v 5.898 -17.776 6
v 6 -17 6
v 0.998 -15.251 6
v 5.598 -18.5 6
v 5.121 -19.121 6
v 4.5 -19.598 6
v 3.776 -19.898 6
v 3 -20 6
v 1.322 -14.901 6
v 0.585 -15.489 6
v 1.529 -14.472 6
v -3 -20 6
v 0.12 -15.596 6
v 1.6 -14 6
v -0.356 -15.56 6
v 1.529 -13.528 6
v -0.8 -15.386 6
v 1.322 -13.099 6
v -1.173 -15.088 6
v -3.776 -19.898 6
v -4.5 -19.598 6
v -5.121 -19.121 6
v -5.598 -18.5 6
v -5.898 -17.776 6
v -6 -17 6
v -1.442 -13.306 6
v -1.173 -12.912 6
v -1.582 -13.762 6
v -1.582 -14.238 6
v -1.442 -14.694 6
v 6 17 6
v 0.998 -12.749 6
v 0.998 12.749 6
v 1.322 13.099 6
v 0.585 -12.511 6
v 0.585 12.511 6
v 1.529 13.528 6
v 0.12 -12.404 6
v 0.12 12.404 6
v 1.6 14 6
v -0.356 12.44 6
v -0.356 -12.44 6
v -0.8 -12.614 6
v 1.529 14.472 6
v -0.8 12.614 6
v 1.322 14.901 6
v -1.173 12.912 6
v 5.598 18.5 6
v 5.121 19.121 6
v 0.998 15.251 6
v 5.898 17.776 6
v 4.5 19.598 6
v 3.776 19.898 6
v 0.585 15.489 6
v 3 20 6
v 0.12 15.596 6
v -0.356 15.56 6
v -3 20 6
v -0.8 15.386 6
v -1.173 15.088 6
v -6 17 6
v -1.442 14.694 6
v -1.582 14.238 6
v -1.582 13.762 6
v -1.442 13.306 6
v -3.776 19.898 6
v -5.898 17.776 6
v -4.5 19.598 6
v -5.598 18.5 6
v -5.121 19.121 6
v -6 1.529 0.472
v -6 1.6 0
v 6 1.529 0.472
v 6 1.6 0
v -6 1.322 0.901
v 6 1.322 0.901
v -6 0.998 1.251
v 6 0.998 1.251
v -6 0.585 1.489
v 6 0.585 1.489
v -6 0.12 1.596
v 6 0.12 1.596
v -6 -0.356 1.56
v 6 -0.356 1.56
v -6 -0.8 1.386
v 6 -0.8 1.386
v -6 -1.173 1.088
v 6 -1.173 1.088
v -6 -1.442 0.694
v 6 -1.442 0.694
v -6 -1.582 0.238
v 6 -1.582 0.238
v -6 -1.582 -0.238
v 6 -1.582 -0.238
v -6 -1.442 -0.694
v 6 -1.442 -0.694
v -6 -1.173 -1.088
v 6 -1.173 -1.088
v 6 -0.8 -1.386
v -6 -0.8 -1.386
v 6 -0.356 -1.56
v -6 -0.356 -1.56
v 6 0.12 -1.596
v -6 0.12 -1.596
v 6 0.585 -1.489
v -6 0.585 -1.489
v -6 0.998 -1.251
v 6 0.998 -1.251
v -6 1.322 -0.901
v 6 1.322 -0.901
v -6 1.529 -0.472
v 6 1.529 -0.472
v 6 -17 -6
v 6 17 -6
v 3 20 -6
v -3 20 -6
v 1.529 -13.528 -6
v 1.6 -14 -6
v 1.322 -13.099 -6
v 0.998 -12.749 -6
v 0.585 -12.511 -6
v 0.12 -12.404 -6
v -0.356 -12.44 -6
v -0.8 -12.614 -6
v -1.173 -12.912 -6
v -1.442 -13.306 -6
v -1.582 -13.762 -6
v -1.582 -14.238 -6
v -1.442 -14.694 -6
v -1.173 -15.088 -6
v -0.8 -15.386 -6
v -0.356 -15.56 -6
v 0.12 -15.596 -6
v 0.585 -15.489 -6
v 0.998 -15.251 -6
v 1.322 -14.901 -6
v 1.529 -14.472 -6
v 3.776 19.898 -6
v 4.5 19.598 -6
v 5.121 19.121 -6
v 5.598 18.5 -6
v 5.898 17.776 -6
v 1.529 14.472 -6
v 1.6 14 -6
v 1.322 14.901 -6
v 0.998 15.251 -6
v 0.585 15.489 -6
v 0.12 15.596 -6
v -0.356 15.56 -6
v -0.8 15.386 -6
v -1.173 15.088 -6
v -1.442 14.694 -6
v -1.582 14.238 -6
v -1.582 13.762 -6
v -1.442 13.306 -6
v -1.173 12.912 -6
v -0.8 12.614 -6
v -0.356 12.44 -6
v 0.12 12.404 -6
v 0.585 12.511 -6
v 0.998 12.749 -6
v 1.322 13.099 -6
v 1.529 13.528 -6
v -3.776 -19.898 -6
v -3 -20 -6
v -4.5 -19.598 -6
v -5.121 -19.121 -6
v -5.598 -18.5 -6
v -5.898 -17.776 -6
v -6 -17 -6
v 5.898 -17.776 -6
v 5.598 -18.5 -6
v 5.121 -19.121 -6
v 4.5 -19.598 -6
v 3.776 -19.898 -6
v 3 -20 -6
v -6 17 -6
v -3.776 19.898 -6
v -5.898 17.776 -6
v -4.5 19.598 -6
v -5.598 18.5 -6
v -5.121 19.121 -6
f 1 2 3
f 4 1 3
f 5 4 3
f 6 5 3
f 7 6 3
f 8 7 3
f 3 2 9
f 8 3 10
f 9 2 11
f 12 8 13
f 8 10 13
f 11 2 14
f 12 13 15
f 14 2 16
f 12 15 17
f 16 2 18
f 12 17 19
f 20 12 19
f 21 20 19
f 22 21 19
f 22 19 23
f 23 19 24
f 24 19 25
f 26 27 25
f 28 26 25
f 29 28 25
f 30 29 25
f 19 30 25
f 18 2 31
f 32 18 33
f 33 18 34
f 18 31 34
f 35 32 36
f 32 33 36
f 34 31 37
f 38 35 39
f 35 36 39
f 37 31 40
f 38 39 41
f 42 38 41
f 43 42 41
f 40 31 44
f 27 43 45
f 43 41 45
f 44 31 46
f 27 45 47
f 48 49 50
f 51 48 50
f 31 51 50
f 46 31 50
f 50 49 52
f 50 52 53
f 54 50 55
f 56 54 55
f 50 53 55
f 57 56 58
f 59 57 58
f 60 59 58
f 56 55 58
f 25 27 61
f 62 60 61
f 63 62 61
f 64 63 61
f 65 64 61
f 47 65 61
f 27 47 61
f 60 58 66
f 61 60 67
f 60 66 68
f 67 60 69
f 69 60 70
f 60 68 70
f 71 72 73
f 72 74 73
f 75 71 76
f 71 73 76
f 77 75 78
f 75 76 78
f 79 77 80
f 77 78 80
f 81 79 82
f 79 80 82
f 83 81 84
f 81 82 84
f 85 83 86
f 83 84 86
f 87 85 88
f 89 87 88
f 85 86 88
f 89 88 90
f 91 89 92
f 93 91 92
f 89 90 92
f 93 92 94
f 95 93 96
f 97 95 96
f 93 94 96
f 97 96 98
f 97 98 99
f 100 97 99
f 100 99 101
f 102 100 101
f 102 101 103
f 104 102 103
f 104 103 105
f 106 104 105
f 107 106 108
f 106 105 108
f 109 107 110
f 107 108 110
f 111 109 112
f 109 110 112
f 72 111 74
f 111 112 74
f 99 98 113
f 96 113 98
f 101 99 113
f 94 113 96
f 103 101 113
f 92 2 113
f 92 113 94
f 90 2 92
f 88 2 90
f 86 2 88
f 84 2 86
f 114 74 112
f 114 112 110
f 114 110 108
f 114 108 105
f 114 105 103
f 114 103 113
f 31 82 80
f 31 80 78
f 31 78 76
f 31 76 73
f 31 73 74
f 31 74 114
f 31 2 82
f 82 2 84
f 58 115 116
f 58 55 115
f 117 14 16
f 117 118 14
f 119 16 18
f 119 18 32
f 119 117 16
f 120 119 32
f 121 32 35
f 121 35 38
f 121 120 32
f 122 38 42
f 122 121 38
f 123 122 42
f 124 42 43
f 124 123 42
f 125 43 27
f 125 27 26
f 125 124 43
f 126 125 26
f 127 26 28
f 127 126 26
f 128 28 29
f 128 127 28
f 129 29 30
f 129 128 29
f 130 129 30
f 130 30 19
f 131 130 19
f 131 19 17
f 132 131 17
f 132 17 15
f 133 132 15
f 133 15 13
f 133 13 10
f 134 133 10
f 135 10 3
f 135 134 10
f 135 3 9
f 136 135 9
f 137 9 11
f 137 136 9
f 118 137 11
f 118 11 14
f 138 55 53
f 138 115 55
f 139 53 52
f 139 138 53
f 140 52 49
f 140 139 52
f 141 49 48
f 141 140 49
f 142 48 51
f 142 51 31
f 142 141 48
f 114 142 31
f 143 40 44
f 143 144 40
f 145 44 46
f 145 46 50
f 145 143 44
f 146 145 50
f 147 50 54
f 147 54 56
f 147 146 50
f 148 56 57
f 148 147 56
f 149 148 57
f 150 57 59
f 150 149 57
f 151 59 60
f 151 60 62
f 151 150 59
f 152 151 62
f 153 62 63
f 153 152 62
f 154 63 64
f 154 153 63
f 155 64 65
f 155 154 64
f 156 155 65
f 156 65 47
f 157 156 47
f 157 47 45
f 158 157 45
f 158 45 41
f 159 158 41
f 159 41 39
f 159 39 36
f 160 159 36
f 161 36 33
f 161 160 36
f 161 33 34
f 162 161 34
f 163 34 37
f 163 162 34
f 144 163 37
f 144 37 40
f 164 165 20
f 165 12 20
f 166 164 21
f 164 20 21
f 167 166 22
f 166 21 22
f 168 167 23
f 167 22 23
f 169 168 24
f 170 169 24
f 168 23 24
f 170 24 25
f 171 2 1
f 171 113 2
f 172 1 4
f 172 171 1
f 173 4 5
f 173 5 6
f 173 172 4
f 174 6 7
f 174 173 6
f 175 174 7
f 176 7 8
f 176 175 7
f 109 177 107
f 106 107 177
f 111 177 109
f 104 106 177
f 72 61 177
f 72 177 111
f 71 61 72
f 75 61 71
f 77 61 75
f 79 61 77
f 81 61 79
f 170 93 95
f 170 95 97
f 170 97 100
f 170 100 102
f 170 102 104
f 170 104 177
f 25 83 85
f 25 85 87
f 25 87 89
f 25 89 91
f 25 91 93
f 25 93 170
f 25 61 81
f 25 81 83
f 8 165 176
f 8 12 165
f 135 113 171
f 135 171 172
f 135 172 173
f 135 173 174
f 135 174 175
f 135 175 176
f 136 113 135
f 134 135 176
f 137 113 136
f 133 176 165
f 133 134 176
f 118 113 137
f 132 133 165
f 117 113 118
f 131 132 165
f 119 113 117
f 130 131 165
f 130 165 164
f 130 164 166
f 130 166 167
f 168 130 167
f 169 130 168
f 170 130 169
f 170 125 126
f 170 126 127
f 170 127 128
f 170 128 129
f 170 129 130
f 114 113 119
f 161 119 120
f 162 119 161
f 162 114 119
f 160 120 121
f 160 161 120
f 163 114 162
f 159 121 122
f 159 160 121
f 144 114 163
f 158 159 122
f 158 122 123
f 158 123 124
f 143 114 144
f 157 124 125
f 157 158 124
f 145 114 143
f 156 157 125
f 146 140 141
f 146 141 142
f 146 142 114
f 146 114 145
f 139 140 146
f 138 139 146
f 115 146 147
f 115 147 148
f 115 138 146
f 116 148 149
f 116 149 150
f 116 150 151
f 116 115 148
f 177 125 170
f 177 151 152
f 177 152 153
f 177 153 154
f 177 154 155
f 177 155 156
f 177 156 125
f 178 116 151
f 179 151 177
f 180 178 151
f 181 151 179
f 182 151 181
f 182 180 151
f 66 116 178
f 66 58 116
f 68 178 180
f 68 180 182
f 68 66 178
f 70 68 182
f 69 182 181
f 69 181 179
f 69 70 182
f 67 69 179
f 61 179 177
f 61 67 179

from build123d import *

# Parameters (mm, degrees)
SKETCH_R          = 1.6
PAD_DEPTH         = 6
SKETCH001_R       = 1.6
POCKET_DEPTH      = 6.001
POCKET_DEPTH_BACK = -6.001
FILLET_R          = 3


with BuildPart() as part:
    # Sketch → Pad (new body, symmetric)
    with BuildSketch(Plane.XY):
        Polygon((-6, 20), (0, 20), (6, 20), (6, 0), (6, -20), (0, -20), (-6, -20), (-6, 0), align=None)
        with Locations((0, 14)):
            Circle(SKETCH_R, mode=Mode.SUBTRACT)
        with Locations((0, -14)):
            Circle(SKETCH_R, mode=Mode.SUBTRACT)
    extrude(amount=PAD_DEPTH, both=True)

    # Sketch001 → Pocket (cut, two sides)
    with BuildSketch(Plane.YZ) as pocket_sk:
        Circle(SKETCH001_R)
    extrude(amount=-POCKET_DEPTH, mode=Mode.SUBTRACT)
    extrude(pocket_sk.sketch, amount=-POCKET_DEPTH_BACK, mode=Mode.SUBTRACT)

    # Fillet
    fillet_edges = [part.edges().sort_by_distance(p)[0] for p in [
        (6, -20, 0),
        (-6, -20, 0),
        (-6, 20, 0),
        (6, 20, 0),
    ]]
    fillet(fillet_edges, radius=FILLET_R)


solid = part.part
